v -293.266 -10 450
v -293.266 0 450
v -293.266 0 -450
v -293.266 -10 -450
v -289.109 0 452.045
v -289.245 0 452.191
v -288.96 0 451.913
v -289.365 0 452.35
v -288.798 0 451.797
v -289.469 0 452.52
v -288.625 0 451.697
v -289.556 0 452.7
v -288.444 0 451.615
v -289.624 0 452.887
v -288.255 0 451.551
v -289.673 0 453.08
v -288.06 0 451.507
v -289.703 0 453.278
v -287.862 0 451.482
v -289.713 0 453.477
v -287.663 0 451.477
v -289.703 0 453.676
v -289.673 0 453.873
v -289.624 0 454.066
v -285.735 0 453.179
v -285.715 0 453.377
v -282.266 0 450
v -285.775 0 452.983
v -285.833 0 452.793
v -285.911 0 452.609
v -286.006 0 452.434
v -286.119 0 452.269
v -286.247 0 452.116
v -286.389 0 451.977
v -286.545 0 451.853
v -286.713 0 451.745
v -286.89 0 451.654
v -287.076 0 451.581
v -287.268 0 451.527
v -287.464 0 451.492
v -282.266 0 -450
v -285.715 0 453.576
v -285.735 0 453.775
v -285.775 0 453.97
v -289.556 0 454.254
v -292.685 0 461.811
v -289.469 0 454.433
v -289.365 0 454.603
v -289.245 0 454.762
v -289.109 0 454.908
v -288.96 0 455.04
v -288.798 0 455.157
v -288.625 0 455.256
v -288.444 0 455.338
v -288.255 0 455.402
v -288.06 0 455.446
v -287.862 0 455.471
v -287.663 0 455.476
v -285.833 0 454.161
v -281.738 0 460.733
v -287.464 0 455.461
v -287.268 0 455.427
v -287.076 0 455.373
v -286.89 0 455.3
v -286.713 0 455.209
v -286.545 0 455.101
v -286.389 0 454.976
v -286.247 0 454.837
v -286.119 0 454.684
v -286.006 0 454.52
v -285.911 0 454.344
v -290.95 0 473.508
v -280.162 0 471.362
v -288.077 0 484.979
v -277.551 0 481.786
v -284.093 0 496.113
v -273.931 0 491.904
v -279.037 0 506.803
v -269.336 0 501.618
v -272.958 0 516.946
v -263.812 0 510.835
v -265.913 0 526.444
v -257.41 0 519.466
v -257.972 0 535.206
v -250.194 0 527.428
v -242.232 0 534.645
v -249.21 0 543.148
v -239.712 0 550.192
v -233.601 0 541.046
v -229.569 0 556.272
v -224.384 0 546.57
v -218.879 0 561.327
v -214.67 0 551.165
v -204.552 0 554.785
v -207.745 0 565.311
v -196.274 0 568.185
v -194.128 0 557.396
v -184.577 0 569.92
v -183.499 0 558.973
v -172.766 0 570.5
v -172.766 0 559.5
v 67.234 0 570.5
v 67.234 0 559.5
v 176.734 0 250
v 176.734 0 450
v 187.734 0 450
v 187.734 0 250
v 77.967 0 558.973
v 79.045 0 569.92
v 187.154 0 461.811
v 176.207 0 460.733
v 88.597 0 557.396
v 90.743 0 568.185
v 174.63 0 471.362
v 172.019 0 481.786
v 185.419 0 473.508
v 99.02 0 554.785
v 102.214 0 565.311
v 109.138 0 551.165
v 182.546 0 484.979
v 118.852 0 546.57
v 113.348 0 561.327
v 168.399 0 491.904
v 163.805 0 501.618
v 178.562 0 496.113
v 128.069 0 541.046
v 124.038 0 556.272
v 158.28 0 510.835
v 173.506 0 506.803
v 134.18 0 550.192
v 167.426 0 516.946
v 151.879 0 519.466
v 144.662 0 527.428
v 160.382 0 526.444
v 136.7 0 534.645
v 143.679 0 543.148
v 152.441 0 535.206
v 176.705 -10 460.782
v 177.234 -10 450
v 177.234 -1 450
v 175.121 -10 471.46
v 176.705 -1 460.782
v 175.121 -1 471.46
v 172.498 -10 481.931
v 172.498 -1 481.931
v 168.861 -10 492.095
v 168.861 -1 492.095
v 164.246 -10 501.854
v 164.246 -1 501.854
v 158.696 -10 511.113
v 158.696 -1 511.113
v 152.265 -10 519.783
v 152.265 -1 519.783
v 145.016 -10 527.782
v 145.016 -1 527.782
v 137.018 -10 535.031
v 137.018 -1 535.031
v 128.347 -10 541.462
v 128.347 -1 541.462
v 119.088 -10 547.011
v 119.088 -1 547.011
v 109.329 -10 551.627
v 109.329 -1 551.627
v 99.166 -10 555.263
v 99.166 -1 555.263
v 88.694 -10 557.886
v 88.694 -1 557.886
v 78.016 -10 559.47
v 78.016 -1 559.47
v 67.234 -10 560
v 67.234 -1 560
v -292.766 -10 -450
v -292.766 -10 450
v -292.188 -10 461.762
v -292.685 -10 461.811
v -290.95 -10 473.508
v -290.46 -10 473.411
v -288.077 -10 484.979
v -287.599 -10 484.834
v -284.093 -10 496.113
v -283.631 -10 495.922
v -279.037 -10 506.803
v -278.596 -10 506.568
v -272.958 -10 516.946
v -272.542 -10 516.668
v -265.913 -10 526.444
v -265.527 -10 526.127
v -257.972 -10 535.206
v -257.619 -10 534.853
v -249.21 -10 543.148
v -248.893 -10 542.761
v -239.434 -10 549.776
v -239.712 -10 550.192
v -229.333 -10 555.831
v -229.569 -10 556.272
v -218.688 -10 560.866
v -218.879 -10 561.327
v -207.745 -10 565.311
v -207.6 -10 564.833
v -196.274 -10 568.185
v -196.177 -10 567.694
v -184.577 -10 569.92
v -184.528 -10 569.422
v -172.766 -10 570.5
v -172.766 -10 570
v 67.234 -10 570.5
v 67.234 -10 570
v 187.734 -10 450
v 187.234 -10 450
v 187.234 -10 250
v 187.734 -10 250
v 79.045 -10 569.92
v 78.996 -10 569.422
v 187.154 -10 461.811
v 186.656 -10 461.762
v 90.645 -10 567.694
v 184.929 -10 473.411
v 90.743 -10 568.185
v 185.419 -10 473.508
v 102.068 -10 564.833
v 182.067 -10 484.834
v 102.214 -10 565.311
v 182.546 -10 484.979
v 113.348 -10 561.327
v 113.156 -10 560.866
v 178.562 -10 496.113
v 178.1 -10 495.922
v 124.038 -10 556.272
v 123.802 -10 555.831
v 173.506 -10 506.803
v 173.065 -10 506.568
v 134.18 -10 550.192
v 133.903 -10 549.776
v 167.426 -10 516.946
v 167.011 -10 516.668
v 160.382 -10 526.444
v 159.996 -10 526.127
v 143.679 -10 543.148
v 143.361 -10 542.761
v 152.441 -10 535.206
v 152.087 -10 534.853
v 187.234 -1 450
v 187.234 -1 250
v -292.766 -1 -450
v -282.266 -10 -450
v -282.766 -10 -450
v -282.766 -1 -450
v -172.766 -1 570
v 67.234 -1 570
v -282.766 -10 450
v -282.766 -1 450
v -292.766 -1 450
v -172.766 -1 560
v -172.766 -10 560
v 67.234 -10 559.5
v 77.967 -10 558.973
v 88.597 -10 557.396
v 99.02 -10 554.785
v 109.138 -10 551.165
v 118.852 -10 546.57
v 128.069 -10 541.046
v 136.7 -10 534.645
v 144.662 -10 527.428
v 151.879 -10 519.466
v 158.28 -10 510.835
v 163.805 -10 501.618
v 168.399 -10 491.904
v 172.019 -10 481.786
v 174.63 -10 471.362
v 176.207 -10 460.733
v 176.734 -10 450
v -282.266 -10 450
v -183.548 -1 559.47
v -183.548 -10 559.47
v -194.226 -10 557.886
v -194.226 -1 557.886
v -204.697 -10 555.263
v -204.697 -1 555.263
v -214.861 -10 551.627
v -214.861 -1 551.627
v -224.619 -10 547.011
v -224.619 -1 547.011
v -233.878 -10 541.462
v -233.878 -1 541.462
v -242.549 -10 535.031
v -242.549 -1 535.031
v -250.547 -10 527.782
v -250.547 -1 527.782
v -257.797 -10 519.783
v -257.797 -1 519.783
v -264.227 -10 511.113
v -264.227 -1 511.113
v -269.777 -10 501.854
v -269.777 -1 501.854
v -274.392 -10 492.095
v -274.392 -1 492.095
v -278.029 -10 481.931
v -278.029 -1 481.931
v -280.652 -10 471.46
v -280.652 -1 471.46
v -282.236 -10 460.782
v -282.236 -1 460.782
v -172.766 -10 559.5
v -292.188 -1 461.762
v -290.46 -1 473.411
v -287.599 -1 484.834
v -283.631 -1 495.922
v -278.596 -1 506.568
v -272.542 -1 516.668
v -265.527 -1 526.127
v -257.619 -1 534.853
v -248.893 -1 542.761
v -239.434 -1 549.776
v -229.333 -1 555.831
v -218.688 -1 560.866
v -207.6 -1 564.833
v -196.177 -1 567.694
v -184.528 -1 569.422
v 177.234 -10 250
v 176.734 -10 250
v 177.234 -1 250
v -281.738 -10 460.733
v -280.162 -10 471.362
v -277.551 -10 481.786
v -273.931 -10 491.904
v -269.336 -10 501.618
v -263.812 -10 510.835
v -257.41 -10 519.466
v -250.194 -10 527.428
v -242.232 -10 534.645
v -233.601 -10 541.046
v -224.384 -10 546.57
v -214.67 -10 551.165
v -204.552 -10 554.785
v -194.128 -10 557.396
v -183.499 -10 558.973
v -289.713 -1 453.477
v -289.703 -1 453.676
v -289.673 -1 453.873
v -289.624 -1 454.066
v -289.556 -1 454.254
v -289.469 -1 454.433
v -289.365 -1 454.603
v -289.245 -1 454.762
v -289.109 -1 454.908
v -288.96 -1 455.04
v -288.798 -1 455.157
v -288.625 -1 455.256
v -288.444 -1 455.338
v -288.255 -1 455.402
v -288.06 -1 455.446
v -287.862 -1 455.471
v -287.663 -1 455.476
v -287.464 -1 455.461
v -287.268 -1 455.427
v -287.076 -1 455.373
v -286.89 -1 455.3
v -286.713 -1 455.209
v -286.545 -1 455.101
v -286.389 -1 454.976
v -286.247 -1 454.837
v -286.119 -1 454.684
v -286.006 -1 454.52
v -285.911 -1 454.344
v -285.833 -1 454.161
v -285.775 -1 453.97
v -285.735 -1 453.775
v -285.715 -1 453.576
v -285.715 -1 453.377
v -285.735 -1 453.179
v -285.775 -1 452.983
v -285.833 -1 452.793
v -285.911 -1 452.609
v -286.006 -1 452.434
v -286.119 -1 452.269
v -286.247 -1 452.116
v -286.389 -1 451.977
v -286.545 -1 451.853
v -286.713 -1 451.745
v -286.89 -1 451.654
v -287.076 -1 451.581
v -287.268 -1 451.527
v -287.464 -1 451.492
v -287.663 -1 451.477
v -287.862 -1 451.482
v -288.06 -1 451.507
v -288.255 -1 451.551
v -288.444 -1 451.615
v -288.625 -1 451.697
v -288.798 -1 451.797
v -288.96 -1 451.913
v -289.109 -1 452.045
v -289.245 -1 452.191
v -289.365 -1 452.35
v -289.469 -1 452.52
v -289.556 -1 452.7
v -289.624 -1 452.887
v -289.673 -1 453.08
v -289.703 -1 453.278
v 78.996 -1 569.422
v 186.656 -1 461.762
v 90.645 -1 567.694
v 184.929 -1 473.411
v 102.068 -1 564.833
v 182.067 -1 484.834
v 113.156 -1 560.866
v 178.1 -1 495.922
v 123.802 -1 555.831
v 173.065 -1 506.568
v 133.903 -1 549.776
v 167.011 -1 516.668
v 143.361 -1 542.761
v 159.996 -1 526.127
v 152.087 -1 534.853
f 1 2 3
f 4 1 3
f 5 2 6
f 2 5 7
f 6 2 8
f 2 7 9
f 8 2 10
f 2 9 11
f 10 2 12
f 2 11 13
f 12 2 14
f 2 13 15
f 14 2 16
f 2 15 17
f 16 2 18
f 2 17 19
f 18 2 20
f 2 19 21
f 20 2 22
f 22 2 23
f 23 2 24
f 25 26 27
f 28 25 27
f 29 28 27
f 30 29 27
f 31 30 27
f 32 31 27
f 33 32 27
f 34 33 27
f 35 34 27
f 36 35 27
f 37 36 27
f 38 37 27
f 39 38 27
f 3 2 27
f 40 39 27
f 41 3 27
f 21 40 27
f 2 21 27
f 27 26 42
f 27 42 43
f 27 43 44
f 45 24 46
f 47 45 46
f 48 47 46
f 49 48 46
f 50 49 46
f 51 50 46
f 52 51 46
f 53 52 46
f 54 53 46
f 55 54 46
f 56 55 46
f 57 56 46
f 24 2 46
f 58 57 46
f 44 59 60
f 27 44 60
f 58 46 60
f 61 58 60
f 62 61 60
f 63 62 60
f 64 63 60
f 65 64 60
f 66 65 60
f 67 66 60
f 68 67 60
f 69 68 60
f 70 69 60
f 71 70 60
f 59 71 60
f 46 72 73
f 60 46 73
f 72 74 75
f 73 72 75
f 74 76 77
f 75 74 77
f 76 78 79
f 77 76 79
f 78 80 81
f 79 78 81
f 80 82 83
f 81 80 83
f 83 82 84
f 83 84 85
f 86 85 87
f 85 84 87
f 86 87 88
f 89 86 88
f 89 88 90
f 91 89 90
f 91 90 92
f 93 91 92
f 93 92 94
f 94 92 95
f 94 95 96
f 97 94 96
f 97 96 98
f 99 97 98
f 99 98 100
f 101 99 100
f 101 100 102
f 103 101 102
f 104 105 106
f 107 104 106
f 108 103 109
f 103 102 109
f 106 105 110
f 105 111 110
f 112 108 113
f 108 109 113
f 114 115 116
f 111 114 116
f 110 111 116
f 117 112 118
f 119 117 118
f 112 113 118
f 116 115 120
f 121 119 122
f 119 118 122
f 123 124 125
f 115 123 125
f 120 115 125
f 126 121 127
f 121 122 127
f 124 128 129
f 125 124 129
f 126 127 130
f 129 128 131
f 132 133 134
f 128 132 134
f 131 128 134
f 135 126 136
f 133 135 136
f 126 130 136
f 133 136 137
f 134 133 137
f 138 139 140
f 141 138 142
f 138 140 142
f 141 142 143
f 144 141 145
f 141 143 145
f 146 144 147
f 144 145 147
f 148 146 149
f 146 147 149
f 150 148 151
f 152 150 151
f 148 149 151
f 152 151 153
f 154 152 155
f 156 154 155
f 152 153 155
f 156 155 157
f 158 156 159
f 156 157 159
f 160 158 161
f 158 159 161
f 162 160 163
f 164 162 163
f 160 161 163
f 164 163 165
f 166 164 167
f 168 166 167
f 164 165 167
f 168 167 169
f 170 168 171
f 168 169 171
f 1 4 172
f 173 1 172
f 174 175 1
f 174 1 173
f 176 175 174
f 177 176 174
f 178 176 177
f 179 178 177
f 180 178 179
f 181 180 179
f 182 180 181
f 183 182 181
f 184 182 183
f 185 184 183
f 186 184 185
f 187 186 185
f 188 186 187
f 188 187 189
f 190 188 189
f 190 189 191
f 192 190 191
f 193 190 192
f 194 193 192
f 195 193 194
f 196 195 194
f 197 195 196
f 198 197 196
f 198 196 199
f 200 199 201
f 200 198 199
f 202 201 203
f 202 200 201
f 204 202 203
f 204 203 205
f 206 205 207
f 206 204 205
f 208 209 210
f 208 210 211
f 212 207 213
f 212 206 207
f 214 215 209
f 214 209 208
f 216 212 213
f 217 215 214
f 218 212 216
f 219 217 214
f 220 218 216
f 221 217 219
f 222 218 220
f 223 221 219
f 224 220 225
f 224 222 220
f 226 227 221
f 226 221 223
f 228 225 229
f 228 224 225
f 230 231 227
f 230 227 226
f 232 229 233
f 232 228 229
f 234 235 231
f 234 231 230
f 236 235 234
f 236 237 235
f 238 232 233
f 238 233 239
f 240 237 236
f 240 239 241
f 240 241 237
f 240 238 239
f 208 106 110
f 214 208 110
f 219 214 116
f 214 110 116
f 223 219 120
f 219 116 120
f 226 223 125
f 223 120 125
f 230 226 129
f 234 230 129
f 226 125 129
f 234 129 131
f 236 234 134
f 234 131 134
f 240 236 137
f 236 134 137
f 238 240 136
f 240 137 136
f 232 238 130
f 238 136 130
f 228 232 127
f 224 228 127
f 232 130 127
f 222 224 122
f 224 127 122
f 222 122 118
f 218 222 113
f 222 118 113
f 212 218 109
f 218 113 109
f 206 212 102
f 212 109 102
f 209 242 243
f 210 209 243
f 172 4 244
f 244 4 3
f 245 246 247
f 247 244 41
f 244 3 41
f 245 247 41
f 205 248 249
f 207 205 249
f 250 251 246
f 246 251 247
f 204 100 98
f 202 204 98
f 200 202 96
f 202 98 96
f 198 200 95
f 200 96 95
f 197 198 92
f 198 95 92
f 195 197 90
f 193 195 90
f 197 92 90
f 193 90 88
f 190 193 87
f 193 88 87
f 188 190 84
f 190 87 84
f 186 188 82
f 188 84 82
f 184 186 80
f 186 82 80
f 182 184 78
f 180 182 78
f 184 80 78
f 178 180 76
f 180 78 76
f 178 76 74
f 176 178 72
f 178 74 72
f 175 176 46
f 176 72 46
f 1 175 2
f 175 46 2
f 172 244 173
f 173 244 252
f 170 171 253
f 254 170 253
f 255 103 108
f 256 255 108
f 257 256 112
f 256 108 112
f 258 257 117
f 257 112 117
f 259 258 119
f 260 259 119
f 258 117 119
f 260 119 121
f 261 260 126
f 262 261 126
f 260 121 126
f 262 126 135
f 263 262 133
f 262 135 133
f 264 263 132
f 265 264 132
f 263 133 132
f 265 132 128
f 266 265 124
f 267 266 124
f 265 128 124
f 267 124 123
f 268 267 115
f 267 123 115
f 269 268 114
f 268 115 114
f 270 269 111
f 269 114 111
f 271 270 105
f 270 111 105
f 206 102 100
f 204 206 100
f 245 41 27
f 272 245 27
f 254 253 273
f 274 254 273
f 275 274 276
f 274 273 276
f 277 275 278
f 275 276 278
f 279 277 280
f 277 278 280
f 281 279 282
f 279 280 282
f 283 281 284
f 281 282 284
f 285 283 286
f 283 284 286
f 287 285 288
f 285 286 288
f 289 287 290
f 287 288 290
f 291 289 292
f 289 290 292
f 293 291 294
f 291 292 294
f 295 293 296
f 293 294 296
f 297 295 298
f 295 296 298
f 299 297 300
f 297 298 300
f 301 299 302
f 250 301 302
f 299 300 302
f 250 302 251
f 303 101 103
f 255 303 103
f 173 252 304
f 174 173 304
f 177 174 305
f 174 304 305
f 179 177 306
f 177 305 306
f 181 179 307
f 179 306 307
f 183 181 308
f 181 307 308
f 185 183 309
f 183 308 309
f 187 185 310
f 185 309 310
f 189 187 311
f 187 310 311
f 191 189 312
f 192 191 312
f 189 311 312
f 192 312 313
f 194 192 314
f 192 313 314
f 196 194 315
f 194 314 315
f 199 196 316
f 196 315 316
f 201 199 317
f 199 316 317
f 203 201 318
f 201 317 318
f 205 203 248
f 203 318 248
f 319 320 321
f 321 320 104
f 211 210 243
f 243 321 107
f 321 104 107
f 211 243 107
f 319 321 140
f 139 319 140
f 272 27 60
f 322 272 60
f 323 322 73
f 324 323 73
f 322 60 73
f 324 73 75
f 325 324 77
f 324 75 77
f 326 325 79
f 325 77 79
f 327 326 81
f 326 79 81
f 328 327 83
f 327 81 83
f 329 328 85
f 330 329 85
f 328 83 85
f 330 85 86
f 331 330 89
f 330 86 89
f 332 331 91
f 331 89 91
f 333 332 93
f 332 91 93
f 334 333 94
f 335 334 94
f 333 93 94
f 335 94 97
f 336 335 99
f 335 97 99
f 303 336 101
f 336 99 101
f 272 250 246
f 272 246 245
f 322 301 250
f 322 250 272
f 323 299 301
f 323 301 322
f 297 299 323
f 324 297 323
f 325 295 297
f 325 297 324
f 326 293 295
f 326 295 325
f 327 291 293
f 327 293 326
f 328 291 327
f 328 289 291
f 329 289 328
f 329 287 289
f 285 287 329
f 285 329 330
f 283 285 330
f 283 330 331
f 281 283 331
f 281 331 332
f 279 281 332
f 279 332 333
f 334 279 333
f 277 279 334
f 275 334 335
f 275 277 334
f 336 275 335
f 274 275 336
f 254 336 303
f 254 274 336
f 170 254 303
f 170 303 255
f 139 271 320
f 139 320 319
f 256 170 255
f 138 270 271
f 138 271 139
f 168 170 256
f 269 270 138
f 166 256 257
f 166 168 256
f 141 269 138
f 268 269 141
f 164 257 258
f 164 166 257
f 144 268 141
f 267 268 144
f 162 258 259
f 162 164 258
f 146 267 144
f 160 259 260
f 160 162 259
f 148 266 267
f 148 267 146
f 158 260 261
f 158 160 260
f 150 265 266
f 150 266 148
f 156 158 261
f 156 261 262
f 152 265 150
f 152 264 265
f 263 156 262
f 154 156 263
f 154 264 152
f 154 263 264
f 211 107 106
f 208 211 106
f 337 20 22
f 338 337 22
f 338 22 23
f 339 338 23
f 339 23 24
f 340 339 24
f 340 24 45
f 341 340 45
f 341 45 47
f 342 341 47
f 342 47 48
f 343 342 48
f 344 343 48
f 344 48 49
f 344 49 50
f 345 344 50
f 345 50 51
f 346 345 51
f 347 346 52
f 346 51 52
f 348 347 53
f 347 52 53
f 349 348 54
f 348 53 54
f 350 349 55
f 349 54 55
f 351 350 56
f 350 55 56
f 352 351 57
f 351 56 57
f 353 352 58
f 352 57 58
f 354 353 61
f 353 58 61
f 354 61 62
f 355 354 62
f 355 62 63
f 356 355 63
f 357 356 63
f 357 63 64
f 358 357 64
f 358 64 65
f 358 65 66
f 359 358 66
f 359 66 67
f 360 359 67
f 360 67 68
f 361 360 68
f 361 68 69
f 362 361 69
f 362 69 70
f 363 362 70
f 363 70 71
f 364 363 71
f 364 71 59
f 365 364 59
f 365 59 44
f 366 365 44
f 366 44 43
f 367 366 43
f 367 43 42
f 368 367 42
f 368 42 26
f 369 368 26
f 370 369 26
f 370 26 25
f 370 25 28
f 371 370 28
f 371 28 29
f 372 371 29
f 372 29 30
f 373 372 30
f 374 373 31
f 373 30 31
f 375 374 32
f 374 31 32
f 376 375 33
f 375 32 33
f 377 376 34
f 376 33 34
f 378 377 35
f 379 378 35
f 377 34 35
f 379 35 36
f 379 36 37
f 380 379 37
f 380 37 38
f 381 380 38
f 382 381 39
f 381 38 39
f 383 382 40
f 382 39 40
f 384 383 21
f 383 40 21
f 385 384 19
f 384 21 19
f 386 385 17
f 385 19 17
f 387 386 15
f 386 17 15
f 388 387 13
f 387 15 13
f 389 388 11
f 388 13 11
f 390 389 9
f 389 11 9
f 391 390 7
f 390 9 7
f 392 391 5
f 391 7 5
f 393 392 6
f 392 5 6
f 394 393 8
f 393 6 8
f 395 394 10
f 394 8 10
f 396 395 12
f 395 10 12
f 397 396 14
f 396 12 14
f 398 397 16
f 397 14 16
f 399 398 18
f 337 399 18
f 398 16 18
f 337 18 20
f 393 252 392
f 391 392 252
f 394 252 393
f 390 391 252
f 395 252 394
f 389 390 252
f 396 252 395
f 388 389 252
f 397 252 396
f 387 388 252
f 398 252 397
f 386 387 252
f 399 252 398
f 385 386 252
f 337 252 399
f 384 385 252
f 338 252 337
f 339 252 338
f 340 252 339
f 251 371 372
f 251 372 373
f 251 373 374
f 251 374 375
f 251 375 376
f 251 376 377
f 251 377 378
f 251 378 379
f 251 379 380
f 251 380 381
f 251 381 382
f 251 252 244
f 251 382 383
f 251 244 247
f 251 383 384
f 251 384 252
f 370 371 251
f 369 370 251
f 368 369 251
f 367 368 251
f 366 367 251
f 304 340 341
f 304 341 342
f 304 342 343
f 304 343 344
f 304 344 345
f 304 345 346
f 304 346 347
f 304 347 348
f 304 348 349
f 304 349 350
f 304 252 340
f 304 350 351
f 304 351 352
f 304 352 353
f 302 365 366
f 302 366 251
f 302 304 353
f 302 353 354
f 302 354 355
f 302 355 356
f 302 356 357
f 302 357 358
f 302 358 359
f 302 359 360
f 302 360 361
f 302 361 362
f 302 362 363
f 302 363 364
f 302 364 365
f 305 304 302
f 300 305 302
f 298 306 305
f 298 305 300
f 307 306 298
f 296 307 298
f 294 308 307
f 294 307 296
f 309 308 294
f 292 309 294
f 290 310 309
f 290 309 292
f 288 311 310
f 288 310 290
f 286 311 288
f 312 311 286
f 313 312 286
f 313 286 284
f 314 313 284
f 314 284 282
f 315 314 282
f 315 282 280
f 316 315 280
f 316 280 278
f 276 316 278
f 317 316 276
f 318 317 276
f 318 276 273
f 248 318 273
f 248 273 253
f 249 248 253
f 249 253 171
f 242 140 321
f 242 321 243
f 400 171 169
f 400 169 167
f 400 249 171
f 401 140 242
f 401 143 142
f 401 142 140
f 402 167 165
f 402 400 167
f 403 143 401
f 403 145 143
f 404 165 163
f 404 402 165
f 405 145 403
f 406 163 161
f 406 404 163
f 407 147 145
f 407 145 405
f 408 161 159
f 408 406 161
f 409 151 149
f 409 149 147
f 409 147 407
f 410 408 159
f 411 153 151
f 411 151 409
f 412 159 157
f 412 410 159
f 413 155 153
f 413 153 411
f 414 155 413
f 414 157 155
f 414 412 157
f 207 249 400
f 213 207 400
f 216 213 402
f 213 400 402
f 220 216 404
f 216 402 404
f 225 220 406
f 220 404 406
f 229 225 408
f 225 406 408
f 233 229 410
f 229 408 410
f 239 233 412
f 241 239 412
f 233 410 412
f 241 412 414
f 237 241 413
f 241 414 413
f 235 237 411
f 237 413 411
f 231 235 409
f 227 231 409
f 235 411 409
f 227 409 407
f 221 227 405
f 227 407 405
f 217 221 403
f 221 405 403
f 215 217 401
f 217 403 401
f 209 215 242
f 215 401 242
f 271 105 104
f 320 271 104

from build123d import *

# Parameters (mm, degrees)
F1_DEPTH = 1
F2_DEPTH = 10
F3_DEPTH = 700
F5_D     = 4


with BuildPart() as f1:
    # F0 (on Front) → F1 (new body)
    with BuildSketch(Plane.XZ):
        with BuildLine():
            Line((-292.7657316476, 450), (-292.7657316476, -450))
            Line((-292.7657316476, -450), (-287.7657316476, -450))
            Line((-287.7657316476, -450), (-282.7657316476, -450))
            Line((-282.7657316476, -450), (-282.7657316476, 450))
            ThreePointArc((-282.7657316476, 450), (-250.5474775781, 527.7817459305), (-172.7657316476, 560))
            Line((-172.7657316476, 560), (67.2342683524, 560))
            ThreePointArc((67.2342683524, 560), (145.0160142829, 527.7817459305), (177.2342683524, 450))
            Line((177.2342683524, 450), (177.2342683524, -450))
            Line((177.2342683524, -450), (187.2342683524, -450))
            Line((187.2342683524, -450), (187.2342683524, 450))
            ThreePointArc((187.2342683524, 450), (152.0870820948, 534.8528137424), (67.2342683524, 570))
            Line((67.2342683524, 570), (-172.7657316476, 570))
            ThreePointArc((-172.7657316476, 570), (-257.61854539, 534.8528137424), (-292.7657316476, 450))
        make_face()
    extrude(amount=F1_DEPTH)

    # F0 (on Front) → F2 (join)
    with BuildSketch(Plane.XZ):
        with BuildLine():
            Line((-293.2657316476, 450), (-293.2657316476, -450))
            Line((-293.2657316476, -450), (-292.7657316476, -450))
            Line((-292.7657316476, -450), (-292.7657316476, 450))
            ThreePointArc((-292.7657316476, 450), (-257.61854539, 534.8528137424), (-172.7657316476, 570))
            Line((-172.7657316476, 570), (67.2342683524, 570))
            ThreePointArc((67.2342683524, 570), (152.0870820948, 534.8528137424), (187.2342683524, 450))
            Line((187.2342683524, 450), (187.2342683524, -450))
            Line((187.2342683524, -450), (187.7342683524, -450))
            Line((187.7342683524, -450), (187.7342683524, 450))
            ThreePointArc((187.7342683524, 450), (152.4406354854, 535.206367133), (67.2342683524, 570.5))
            Line((67.2342683524, 570.5), (-172.7657316476, 570.5))
            ThreePointArc((-172.7657316476, 570.5), (-257.9720987806, 535.206367133), (-293.2657316476, 450))
        make_face()
        with BuildLine():
            Line((-282.7657316476, 450), (-282.7657316476, -450))
            Line((-282.7657316476, -450), (-282.2657316476, -450))
            Line((-282.2657316476, -450), (-282.2657316476, 450))
            ThreePointArc((-282.2657316476, 450), (-250.1939241875, 527.4281925399), (-172.7657316476, 559.5))
            Line((-172.7657316476, 559.5), (67.2342683524, 559.5))
            ThreePointArc((67.2342683524, 559.5), (144.6624608923, 527.4281925399), (176.7342683524, 450))
            Line((176.7342683524, 450), (176.7342683524, -450))
            Line((176.7342683524, -450), (177.2342683524, -450))
            Line((177.2342683524, -450), (177.2342683524, 450))
            ThreePointArc((177.2342683524, 450), (145.0160142829, 527.7817459305), (67.2342683524, 560))
            Line((67.2342683524, 560), (-172.7657316476, 560))
            ThreePointArc((-172.7657316476, 560), (-250.5474775781, 527.7817459305), (-282.7657316476, 450))
        make_face()
    extrude(amount=F2_DEPTH)

    # F3 (cut): a face of the model
    f3_faces = [f1.faces().sort_by_distance(p)[0] for p in [
        (182.2342683524, -0.1486606875, -450),
    ]]
    extrude(f3_faces, amount=-F3_DEPTH, mode=Mode.SUBTRACT)

    # F5 (through all)
    with Locations(Plane.XZ.offset(1)):
        with Locations((-287.7128323337, 453.4766965134)):
            Hole(F5_D / 2)


solid = f1.part
